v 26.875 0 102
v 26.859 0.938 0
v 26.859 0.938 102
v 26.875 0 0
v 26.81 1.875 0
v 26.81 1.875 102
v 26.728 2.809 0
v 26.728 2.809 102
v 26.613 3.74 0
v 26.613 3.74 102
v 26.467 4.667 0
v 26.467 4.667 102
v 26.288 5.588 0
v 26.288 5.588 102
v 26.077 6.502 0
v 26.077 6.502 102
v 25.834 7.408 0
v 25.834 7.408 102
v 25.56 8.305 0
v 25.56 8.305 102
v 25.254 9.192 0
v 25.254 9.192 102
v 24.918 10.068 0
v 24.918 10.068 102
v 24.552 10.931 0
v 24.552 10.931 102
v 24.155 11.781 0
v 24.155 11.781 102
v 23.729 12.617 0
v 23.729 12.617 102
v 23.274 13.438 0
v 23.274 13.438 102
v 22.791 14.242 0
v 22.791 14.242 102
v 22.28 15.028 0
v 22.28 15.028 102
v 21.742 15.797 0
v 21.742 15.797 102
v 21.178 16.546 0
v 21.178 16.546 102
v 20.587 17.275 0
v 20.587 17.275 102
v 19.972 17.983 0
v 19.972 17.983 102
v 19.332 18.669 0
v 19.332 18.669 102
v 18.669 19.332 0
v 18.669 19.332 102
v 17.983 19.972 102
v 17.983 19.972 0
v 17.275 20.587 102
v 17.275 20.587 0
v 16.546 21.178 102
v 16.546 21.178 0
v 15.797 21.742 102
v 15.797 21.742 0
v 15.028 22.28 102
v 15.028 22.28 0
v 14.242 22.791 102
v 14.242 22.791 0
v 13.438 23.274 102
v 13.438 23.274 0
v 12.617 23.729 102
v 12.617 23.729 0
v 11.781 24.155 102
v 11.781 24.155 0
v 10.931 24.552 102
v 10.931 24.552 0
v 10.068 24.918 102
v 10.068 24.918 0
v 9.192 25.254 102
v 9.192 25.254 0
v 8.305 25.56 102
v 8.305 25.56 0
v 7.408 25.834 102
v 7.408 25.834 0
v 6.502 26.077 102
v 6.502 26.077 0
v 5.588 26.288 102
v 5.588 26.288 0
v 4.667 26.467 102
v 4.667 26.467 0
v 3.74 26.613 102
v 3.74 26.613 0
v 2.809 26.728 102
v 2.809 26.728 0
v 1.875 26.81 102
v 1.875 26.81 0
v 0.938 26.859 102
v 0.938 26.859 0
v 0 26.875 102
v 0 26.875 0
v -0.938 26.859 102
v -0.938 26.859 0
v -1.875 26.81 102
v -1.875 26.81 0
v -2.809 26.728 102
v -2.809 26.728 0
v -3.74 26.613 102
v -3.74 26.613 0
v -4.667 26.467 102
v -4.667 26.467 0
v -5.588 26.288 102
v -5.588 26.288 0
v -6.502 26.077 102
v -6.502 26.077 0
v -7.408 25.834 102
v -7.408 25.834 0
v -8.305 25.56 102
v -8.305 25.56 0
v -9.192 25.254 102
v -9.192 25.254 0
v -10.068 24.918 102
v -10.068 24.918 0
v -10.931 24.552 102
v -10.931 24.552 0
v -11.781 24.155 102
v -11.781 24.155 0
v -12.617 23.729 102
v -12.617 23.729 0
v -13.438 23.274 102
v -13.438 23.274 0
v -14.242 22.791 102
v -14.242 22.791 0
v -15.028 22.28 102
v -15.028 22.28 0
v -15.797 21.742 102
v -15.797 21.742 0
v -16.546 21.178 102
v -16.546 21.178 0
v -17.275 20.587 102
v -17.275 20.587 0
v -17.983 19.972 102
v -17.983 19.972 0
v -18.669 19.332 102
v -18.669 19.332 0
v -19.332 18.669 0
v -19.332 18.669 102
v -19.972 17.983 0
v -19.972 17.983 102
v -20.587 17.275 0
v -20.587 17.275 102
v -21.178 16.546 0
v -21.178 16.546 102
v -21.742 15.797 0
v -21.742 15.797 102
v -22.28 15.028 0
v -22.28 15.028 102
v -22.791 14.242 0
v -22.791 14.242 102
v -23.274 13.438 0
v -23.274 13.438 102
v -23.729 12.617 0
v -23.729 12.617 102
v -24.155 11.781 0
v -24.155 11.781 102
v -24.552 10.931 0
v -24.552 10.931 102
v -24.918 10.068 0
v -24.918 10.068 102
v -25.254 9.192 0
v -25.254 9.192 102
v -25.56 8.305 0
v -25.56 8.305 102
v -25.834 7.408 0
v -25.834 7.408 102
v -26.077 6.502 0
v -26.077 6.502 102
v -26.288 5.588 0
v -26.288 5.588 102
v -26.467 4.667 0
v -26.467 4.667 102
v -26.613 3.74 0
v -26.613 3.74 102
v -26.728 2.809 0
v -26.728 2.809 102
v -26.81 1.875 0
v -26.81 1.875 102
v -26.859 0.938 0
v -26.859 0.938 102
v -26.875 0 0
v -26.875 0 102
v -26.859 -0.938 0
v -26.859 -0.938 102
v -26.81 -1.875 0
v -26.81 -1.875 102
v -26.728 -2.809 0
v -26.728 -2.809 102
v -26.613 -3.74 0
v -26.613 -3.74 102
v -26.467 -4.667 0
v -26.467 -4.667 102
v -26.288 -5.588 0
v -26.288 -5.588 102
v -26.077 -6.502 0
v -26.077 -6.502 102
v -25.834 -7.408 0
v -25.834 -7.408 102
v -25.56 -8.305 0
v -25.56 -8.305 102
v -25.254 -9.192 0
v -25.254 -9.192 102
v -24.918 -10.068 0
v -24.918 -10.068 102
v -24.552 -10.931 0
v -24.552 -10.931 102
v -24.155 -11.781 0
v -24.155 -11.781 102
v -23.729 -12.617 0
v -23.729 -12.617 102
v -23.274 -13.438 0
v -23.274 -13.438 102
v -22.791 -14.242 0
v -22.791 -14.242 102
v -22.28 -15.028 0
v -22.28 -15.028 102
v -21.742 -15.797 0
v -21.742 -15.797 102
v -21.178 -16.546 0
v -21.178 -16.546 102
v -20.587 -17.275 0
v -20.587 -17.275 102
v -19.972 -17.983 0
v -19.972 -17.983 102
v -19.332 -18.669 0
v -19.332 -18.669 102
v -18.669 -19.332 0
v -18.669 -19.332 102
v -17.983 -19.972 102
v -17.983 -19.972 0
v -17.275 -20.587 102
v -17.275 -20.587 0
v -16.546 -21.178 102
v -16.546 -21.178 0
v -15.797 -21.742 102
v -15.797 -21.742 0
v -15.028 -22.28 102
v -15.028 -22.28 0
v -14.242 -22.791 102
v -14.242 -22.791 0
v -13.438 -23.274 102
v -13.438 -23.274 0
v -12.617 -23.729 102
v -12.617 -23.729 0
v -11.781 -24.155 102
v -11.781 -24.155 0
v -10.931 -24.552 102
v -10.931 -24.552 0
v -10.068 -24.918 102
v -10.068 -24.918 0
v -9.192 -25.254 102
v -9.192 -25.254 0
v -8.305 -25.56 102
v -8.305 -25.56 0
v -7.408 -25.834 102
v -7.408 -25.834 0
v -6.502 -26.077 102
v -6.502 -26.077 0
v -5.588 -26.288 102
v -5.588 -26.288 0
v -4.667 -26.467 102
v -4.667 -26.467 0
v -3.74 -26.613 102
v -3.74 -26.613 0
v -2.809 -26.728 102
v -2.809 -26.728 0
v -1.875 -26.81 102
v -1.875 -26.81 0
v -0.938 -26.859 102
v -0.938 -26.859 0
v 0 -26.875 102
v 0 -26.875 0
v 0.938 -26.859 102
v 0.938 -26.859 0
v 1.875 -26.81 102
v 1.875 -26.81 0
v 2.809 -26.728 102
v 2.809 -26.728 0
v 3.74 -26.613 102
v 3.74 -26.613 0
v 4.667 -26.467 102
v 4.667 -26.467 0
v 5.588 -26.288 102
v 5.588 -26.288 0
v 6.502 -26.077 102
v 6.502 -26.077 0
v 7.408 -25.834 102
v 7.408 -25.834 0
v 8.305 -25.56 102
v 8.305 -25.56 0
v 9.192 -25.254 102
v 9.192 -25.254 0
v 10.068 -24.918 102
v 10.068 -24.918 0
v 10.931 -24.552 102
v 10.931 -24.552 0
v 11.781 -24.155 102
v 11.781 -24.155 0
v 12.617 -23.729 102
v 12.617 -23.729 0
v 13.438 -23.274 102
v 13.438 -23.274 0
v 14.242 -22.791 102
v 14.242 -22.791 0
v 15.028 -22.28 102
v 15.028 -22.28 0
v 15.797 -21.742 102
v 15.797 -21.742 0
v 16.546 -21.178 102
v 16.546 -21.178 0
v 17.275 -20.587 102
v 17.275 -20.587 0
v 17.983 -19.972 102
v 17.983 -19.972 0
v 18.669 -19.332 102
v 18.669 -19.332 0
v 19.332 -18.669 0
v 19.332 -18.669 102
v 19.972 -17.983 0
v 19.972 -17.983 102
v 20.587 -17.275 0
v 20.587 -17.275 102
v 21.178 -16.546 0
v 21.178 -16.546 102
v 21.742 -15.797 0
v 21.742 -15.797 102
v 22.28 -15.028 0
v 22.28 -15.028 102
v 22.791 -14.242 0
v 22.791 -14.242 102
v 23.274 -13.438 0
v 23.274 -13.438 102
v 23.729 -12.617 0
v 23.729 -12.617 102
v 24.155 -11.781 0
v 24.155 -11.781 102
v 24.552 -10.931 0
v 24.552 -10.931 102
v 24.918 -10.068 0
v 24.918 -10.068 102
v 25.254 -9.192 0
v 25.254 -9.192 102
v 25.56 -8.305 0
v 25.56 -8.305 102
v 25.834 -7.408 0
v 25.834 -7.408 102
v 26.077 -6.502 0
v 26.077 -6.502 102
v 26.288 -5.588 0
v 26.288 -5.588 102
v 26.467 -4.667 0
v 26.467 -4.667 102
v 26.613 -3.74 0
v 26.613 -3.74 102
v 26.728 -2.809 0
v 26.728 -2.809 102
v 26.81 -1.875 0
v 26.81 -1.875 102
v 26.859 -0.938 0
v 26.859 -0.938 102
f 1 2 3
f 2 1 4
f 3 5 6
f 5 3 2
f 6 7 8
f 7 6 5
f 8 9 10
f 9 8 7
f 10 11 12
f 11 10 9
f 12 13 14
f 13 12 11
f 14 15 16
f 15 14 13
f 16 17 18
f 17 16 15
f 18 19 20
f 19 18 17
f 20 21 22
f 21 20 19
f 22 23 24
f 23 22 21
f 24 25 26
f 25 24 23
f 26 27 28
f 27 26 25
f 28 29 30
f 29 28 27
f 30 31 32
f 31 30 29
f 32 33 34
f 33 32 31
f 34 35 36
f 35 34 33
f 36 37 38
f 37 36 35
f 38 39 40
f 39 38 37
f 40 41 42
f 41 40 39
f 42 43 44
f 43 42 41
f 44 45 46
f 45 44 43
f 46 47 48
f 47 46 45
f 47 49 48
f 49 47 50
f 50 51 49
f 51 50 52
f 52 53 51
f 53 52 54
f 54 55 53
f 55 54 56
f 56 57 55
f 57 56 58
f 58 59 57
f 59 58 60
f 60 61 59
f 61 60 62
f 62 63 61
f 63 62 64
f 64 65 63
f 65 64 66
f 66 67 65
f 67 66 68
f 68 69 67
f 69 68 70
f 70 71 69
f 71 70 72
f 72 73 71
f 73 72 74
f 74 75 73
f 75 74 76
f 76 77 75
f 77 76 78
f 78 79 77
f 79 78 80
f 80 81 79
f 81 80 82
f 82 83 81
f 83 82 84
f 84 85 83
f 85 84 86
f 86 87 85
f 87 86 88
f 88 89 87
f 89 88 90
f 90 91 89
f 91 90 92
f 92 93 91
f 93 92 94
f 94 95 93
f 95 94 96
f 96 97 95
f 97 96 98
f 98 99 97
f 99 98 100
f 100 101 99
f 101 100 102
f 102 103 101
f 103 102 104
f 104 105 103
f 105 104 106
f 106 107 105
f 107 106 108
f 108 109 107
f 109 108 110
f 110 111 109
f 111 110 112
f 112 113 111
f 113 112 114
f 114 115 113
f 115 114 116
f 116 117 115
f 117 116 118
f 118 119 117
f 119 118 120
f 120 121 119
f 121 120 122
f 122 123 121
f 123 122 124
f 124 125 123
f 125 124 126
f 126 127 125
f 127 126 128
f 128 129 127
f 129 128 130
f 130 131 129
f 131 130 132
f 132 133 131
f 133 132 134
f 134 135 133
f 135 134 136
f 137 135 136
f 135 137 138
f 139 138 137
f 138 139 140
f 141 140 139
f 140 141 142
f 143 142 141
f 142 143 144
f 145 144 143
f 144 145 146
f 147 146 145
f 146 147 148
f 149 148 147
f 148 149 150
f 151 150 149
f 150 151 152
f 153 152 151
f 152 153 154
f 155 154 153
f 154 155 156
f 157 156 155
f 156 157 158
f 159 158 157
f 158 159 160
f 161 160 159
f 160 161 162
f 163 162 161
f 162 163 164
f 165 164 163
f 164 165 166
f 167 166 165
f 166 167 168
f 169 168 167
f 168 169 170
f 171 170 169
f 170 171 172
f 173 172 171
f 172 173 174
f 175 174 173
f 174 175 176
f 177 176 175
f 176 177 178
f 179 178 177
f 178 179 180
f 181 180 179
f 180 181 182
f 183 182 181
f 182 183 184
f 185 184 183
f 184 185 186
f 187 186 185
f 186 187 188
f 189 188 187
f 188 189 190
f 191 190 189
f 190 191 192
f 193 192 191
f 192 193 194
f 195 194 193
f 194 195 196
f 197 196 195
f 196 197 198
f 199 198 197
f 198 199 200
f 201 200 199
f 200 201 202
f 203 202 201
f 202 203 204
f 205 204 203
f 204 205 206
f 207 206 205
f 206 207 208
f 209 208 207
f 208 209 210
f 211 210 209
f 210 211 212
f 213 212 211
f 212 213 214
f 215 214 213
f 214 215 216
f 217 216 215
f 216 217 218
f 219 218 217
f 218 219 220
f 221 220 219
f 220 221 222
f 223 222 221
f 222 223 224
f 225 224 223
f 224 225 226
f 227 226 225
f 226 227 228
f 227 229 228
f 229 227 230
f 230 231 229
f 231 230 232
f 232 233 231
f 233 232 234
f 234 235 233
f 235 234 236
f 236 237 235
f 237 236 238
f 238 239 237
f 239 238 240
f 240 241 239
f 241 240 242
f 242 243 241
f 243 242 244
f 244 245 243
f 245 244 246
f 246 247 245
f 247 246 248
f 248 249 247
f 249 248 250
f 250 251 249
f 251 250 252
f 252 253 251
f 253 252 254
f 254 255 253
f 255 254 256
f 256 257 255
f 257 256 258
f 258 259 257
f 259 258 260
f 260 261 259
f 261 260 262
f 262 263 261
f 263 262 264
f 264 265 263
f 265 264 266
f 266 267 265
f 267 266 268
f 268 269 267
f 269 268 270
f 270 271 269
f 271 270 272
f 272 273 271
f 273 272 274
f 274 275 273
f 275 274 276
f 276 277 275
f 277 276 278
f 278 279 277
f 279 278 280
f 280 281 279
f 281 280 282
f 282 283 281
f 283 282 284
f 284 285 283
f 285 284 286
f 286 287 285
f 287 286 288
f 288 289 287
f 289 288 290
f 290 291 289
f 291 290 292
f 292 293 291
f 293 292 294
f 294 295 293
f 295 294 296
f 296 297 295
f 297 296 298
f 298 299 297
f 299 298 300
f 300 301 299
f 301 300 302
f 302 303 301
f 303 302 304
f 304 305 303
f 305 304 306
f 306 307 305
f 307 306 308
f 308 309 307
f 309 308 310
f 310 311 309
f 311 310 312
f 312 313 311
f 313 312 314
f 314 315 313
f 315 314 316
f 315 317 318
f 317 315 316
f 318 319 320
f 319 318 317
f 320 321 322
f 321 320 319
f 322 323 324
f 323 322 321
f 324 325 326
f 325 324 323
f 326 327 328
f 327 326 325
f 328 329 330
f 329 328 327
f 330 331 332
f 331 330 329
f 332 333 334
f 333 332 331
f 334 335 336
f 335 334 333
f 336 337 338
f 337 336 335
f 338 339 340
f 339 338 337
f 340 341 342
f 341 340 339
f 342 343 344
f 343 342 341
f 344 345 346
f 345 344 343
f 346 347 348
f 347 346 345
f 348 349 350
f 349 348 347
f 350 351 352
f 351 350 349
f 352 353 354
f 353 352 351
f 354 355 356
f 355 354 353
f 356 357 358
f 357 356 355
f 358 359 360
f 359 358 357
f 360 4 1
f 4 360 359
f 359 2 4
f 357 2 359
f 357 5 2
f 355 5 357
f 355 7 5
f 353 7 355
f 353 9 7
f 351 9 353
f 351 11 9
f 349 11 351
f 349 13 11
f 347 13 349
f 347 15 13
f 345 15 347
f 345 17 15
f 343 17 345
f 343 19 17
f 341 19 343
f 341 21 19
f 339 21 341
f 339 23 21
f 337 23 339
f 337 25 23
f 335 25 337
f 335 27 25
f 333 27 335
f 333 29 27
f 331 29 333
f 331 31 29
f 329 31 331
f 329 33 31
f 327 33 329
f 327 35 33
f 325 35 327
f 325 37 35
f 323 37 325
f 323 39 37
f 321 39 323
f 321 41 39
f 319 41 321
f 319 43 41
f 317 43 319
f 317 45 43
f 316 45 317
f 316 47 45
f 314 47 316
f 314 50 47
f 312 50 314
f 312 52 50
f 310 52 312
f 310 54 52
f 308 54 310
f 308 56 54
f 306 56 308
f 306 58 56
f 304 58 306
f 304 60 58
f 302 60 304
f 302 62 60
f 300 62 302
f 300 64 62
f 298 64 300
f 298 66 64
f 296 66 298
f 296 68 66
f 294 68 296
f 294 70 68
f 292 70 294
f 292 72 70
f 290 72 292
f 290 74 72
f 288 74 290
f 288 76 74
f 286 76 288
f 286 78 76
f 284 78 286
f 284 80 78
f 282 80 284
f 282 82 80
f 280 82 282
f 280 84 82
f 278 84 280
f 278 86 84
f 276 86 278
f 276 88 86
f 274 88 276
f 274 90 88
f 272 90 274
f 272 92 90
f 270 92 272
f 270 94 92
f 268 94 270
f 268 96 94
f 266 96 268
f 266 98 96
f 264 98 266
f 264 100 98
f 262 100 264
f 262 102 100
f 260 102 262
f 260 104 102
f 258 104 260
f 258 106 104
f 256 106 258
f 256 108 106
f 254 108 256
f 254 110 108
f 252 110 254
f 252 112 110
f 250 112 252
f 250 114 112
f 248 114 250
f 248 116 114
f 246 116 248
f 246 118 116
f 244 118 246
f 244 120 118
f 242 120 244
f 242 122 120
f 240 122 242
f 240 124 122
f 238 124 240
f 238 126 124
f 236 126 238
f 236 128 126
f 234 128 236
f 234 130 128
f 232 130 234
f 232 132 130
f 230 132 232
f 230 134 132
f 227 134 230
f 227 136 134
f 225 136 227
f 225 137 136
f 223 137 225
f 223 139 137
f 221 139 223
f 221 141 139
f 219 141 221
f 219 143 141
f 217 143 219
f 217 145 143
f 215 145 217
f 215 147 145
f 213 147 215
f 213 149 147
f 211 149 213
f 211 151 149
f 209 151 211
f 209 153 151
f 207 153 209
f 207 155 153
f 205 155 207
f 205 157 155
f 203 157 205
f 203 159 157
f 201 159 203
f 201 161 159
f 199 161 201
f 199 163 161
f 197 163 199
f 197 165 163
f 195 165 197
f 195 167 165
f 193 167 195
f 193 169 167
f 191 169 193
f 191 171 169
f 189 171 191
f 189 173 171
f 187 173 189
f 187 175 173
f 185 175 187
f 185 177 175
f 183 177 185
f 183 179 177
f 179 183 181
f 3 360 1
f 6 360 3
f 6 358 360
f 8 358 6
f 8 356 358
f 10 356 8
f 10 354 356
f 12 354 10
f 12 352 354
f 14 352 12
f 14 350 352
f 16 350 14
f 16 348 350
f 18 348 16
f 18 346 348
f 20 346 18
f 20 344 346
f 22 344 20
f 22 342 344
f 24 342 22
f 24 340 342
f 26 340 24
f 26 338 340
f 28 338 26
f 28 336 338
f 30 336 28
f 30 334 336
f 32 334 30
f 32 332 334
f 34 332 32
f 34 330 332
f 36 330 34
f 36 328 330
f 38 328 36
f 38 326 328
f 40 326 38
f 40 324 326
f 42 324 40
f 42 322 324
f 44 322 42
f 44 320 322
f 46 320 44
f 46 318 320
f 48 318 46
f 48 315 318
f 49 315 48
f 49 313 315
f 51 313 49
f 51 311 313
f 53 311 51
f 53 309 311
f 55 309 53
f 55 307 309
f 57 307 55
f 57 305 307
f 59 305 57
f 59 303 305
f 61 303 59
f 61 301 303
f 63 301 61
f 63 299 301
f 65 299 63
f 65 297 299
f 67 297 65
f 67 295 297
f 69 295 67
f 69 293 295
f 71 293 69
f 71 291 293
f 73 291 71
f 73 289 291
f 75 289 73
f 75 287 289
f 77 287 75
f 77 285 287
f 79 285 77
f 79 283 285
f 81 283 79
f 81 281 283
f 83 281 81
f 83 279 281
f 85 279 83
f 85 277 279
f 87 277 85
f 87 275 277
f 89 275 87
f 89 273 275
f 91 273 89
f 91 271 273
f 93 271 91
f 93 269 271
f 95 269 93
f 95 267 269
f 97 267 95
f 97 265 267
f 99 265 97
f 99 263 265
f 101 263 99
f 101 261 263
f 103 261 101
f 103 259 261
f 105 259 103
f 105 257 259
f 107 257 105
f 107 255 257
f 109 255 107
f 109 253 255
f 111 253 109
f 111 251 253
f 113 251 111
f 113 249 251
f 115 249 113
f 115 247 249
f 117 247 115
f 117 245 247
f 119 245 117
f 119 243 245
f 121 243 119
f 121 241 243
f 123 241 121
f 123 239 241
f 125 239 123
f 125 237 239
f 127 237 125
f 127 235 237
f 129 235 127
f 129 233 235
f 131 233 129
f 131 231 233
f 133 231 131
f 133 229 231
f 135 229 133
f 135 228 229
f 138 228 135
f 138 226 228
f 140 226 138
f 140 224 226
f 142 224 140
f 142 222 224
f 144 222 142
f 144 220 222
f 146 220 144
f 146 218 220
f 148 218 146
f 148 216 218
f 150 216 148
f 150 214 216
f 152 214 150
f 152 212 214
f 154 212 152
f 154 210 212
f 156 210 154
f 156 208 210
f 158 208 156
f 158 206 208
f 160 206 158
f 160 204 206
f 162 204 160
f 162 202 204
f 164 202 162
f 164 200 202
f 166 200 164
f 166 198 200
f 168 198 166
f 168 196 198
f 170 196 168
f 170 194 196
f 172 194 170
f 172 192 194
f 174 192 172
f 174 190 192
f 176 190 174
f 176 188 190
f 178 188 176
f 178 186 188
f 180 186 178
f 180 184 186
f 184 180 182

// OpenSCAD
// pin diameter = 8mm
// roll diameter = 53.75mm
// roll length = 102mm

pin_radius = 4;  // pin diameter = 8mm

roll_radius = 26.875; // roll diameter = 53.75

roll_length = 102;  // roll length (height)


rotate(0,90,0)
cylinder(roll_length, roll_radius, roll_radius, $fn=180);

// 2
